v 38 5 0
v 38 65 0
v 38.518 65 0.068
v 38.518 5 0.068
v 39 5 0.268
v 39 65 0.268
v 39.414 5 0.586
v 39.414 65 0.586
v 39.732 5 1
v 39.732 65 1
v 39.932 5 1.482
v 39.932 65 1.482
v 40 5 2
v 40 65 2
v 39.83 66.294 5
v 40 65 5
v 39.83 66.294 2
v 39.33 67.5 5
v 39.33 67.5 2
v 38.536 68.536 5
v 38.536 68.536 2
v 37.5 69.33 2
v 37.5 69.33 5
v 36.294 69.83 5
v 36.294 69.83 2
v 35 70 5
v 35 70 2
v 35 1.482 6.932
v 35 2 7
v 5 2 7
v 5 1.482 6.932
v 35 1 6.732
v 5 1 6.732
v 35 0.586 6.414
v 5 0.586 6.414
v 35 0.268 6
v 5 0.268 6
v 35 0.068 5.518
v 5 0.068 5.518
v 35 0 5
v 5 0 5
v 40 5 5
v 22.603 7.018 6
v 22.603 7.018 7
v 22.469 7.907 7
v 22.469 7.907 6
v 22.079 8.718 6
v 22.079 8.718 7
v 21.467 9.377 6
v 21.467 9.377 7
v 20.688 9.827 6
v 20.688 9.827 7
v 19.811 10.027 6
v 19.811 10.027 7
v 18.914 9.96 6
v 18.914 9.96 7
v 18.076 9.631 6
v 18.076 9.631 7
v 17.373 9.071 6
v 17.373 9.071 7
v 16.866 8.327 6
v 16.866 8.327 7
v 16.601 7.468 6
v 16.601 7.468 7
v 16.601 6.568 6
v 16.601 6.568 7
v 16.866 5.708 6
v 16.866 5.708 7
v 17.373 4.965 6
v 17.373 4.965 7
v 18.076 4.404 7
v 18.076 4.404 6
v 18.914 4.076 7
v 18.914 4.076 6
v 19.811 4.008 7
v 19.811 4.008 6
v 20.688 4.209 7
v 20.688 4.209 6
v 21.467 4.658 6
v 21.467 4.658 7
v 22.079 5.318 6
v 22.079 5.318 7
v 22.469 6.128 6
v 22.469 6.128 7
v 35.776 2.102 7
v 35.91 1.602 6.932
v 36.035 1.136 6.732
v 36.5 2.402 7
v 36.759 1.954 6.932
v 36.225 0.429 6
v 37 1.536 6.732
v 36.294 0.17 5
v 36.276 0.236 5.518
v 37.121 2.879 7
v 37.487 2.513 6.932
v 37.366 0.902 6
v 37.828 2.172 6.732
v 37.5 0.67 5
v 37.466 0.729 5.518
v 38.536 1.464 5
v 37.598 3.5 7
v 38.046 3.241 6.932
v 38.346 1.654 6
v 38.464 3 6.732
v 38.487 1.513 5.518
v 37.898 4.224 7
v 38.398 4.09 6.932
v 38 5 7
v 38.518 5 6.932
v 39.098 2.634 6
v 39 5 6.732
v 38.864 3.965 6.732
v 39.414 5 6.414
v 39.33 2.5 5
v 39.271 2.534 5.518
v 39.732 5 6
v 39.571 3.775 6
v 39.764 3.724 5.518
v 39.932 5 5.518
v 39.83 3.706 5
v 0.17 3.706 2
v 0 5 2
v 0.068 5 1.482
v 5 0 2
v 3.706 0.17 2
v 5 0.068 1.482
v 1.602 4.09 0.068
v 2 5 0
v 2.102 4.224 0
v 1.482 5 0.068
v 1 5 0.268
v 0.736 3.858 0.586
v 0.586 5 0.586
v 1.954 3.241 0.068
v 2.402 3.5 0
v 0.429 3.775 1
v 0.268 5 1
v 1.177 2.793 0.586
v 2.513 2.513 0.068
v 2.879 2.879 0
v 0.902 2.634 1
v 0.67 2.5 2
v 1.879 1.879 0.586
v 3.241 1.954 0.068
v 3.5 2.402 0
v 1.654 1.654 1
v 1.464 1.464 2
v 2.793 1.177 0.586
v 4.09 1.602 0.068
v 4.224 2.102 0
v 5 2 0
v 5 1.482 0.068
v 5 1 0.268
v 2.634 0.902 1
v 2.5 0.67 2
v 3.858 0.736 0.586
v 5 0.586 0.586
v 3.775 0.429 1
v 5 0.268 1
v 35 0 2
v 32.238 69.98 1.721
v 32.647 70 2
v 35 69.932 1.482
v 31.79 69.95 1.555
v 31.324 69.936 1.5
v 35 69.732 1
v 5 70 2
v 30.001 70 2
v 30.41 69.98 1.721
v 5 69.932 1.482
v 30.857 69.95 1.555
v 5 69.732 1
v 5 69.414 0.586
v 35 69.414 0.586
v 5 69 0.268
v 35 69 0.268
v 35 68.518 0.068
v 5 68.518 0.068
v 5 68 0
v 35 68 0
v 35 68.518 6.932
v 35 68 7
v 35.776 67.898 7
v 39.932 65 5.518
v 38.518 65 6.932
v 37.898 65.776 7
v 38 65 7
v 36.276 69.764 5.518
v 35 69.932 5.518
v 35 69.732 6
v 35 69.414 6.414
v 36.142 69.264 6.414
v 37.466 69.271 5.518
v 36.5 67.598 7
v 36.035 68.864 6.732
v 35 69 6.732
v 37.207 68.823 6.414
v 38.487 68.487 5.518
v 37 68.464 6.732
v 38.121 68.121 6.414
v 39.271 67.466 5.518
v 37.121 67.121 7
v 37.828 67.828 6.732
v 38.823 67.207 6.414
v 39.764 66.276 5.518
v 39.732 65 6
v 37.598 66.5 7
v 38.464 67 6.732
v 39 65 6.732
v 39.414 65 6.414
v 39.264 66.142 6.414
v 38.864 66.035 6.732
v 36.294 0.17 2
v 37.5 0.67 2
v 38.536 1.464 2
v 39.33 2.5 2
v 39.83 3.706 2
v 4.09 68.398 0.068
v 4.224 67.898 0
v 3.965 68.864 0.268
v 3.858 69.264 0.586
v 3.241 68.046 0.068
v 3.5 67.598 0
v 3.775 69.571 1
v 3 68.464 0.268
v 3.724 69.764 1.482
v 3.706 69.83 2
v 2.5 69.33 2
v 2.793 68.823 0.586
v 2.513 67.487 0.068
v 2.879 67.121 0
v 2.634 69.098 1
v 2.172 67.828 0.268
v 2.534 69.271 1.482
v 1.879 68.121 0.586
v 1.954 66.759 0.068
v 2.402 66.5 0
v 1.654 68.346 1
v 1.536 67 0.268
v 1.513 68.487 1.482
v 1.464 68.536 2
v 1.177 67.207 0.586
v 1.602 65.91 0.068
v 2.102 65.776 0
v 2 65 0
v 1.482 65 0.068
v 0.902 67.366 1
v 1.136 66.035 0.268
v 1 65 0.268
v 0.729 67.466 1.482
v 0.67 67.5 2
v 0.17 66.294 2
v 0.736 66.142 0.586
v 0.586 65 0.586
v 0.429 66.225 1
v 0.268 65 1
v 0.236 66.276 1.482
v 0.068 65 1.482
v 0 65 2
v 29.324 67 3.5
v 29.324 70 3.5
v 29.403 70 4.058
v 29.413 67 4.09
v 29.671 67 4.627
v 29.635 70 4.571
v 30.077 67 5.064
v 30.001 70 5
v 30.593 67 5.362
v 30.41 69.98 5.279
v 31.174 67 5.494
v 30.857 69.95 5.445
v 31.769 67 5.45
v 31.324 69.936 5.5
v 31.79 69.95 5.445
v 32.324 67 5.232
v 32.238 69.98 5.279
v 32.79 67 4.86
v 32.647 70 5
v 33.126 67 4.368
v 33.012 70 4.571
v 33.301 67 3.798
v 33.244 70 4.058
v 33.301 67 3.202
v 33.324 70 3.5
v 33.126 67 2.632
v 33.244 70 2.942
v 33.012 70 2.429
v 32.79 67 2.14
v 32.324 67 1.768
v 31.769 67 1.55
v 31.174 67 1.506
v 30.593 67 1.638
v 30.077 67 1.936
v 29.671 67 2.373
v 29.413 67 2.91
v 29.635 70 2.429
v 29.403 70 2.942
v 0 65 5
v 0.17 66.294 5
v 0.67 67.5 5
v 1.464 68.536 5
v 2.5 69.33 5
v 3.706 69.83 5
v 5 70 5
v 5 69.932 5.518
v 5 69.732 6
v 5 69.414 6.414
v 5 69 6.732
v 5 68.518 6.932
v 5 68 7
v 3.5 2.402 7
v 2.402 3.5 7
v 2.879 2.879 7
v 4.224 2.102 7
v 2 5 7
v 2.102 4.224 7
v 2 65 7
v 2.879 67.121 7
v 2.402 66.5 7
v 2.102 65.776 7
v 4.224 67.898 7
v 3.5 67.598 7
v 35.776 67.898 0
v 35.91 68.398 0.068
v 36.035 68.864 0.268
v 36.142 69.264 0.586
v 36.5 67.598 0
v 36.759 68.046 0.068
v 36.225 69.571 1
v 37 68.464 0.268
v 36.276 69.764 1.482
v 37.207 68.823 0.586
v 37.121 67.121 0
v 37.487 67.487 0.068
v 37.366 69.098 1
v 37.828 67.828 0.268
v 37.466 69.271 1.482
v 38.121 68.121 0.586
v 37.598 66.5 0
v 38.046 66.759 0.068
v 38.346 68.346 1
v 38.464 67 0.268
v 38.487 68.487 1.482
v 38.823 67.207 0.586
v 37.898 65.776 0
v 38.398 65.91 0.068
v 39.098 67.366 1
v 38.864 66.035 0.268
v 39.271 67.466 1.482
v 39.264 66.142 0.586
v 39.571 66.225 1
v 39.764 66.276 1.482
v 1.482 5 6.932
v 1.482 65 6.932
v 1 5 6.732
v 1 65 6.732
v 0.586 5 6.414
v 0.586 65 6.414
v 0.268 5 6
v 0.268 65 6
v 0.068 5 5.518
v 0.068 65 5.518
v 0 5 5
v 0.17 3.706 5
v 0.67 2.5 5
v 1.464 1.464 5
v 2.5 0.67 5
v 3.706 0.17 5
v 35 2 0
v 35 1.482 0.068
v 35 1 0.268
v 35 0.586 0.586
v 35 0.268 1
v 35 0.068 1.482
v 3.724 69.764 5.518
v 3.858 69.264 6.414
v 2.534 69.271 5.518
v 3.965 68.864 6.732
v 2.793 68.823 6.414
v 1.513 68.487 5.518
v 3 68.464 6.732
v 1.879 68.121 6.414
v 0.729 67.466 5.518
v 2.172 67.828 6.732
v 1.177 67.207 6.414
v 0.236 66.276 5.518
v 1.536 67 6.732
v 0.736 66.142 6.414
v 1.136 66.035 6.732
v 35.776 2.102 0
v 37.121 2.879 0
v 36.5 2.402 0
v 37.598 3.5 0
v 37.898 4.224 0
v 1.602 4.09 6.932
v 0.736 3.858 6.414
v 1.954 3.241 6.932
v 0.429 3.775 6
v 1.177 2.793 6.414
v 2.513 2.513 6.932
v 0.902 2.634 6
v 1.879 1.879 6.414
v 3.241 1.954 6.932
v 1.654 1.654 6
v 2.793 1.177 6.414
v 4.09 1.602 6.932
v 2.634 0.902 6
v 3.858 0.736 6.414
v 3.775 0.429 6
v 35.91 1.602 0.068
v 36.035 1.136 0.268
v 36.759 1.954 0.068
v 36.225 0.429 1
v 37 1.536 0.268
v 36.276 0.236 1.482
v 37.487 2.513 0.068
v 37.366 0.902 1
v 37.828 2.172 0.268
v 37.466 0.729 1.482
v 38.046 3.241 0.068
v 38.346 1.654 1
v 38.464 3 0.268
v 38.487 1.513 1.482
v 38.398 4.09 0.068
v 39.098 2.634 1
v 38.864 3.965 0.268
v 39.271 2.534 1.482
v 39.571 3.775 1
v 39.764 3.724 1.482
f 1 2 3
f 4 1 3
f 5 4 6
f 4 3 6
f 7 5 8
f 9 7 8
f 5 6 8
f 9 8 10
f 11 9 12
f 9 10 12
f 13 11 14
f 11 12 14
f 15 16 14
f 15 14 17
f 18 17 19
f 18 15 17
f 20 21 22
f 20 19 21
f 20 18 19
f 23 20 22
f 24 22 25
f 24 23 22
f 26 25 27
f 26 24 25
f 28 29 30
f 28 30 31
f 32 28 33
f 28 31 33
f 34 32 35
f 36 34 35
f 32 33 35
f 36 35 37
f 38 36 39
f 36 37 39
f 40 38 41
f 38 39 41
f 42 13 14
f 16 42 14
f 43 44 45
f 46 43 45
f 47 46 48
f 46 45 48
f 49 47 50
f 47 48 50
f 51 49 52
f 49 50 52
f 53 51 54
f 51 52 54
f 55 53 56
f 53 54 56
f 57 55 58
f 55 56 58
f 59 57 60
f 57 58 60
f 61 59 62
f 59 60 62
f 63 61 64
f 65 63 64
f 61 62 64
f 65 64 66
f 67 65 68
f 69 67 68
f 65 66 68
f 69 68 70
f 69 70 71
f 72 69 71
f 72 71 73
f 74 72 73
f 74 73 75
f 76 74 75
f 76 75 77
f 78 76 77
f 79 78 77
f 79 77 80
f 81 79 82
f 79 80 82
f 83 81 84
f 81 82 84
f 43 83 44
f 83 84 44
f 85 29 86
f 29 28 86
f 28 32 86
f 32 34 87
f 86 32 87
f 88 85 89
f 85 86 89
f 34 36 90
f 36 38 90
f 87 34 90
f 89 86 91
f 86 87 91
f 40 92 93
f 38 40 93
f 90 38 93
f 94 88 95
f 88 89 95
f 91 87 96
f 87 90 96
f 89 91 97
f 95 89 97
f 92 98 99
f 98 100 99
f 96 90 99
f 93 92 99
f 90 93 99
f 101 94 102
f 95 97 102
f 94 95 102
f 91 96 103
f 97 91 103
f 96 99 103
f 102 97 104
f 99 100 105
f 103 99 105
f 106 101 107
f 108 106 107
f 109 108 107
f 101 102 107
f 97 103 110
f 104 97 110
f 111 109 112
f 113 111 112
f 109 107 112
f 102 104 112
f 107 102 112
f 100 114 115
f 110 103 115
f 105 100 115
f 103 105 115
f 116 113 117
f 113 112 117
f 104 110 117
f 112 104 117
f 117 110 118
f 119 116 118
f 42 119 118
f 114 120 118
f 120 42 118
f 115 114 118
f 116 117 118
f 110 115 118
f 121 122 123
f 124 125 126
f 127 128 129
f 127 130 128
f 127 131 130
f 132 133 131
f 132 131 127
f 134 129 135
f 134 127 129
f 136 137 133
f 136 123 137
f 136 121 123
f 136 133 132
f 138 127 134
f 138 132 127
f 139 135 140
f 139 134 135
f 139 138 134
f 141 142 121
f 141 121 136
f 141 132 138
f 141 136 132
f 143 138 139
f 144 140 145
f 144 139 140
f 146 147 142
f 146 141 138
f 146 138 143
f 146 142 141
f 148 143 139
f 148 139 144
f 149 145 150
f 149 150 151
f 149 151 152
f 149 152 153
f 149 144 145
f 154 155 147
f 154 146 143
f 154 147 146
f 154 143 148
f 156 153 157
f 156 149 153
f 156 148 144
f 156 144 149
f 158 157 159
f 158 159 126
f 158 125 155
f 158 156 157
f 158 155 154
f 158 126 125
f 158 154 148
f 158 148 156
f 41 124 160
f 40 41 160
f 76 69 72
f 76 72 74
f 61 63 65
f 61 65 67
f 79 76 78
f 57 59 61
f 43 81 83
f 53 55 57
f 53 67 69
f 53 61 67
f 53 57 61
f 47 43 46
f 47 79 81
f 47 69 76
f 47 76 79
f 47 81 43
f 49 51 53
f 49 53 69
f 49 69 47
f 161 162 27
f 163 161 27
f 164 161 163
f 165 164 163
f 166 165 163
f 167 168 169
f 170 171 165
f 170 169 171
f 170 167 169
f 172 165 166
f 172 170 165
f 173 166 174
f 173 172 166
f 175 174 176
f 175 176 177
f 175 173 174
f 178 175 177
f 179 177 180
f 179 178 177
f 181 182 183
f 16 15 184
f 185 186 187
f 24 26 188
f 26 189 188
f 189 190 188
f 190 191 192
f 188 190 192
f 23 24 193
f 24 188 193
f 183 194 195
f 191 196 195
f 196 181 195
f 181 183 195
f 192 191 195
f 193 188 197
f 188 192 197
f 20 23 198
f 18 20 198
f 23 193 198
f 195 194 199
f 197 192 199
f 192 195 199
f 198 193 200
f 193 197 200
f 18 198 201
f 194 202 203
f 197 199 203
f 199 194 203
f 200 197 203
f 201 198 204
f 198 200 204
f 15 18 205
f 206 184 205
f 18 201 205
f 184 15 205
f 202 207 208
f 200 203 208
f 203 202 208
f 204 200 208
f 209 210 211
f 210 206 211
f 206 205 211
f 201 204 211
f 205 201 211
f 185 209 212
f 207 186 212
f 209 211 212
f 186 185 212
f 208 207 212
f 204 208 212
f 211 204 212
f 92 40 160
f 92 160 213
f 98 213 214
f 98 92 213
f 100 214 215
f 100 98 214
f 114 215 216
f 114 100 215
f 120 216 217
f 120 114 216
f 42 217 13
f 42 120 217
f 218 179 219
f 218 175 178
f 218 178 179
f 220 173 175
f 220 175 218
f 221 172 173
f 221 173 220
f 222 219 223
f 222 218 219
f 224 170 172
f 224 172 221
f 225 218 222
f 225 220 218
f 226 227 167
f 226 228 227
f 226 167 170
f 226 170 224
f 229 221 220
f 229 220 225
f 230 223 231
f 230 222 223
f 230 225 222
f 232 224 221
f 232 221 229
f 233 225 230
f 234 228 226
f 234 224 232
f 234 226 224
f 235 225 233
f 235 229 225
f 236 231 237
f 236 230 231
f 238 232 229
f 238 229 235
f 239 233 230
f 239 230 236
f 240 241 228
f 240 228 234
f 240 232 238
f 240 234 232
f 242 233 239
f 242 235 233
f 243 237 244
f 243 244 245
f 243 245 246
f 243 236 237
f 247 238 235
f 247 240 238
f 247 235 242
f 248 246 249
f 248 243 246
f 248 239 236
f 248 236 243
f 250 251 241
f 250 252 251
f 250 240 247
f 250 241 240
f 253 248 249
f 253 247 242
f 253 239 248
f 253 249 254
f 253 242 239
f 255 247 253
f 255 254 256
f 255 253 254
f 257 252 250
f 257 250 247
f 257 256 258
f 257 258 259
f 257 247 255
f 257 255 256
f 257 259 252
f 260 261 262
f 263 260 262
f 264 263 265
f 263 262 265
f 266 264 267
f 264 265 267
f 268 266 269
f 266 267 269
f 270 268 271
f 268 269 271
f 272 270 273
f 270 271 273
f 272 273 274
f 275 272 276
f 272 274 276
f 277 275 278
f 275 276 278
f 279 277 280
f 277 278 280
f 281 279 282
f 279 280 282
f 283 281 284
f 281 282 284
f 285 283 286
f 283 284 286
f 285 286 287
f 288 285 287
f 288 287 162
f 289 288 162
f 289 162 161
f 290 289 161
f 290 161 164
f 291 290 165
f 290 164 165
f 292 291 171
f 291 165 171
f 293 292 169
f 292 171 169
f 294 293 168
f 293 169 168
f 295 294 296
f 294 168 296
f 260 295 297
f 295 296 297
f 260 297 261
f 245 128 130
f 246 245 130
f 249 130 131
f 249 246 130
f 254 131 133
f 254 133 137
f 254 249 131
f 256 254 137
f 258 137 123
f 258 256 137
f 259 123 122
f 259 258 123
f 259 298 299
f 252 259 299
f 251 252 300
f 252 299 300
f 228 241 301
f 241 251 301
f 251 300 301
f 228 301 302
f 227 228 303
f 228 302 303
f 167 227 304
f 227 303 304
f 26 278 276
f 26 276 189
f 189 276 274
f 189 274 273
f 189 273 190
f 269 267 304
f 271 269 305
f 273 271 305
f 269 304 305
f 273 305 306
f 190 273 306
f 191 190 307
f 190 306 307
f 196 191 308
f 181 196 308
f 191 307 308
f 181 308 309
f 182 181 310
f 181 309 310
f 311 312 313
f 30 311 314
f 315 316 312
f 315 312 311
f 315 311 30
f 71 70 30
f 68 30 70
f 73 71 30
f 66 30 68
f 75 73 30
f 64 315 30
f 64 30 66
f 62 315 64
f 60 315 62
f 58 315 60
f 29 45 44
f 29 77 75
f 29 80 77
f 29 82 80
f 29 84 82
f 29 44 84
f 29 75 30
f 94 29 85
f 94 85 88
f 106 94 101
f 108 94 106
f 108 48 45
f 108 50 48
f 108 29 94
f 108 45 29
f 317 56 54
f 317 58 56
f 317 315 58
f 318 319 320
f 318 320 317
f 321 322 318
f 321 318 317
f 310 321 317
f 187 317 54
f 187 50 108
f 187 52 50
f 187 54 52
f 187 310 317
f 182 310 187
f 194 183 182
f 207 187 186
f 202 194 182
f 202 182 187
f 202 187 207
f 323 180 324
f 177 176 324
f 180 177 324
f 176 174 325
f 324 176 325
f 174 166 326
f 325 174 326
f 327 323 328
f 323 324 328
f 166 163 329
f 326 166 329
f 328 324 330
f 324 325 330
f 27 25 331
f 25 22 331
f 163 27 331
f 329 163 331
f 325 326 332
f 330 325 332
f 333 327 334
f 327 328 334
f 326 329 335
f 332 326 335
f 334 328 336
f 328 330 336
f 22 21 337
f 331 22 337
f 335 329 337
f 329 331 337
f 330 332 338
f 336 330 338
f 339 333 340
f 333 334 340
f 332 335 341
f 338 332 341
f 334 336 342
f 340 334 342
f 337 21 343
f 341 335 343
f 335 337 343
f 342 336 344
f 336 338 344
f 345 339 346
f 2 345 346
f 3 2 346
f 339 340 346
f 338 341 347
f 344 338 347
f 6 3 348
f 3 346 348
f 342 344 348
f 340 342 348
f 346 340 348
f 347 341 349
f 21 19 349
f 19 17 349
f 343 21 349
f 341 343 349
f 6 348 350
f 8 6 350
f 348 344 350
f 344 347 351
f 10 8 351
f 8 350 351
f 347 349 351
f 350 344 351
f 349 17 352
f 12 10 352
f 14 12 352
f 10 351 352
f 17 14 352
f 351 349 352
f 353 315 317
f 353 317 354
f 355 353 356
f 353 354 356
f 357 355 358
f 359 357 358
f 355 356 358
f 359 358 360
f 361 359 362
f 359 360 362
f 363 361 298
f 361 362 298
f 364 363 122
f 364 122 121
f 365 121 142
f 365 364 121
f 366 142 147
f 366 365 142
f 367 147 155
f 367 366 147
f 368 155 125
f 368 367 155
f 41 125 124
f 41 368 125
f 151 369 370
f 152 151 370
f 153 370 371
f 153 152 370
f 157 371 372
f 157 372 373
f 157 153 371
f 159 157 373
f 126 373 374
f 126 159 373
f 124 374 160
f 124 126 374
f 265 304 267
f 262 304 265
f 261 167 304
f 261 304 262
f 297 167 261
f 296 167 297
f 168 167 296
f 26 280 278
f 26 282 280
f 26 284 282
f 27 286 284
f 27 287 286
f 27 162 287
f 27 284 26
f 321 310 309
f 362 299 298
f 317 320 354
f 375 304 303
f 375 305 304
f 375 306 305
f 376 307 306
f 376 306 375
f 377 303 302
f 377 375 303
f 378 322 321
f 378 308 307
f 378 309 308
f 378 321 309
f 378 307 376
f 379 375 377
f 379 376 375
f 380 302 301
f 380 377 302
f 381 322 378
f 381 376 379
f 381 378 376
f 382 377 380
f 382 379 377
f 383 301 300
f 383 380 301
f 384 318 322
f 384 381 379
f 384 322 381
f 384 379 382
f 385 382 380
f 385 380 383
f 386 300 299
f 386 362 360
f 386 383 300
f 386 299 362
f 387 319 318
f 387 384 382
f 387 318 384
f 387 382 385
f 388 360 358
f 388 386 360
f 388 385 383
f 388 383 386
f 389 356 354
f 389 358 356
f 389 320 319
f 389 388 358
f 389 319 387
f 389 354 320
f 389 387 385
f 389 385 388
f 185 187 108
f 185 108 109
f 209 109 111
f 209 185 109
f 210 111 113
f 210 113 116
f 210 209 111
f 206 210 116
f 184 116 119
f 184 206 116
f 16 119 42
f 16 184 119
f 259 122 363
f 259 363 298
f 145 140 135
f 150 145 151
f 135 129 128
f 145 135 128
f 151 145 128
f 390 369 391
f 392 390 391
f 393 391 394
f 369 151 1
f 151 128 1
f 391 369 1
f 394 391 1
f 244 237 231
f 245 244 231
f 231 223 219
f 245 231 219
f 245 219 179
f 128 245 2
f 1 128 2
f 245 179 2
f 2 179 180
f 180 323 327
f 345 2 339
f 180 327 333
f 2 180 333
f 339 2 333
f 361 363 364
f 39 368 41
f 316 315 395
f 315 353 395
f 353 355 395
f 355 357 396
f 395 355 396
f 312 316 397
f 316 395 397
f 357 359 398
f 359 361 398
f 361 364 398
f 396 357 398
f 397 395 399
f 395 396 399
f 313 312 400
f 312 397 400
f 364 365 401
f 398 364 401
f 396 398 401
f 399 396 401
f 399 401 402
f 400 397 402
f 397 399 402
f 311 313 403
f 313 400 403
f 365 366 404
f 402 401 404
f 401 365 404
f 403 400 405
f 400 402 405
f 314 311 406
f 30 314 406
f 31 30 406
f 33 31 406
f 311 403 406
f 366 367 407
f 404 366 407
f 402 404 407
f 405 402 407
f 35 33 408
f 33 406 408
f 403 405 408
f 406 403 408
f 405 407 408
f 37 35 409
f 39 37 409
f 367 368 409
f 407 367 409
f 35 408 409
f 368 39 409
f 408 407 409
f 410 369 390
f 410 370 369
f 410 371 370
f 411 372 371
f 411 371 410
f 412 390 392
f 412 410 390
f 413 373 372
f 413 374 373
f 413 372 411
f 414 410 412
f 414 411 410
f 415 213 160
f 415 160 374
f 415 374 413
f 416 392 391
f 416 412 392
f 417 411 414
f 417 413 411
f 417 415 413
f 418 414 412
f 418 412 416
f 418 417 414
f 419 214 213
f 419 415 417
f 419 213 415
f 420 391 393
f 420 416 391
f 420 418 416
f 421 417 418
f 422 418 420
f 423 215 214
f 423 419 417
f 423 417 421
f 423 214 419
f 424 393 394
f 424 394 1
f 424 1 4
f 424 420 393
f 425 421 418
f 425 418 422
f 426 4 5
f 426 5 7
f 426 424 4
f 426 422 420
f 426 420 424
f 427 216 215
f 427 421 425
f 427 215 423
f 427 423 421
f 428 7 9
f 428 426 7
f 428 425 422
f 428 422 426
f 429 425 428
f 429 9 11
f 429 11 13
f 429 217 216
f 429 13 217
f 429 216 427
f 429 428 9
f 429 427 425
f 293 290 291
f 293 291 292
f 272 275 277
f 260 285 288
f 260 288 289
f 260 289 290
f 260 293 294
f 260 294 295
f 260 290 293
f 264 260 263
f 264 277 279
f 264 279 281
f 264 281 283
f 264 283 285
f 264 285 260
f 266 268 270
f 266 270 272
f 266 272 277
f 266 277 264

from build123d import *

# Parameters (mm, degrees)
F0_W         = 40
F0_H         = 70
F1_DEPTH     = 7
F2_R         = 5
F3_R         = 2
F4_DEPTH     = 3
F6_T1_DEPTH  = 60
F6_T3_DEPTH  = 30
F6_T6_ANGLE  = 90
F6_T8_ANGLE  = 90
F6_T10_ANGLE = 90
F6_T12_ANGLE = 90
F6_T14_ANGLE = 90
F6_T16_ANGLE = 90
F6_T18_ANGLE = 90
F6_T20_ANGLE = 90
F7_R         = 3.0179077215
F8_DEPTH     = 1


# Not quite as in the source:
# - a fillet or chamfer that OpenCascade refuses, or shapes differently, is made with other operations: its cross-section is extruded or revolved along the edge and cut away or added
# - a feature of the source that left no trace in its solid (it failed there, or was rolled back) is left out


with BuildPart() as f1:
    # F0 (on Top) → F1 (new body)
    with BuildSketch(Plane.XY):
        with Locations((20, 35)):
            Rectangle(F0_W, F0_H)
    extrude(amount=F1_DEPTH)

    # F2
    f2_edges = [f1.edges().sort_by_distance(p)[0] for p in [
        (40, 0, 3.5),
        (40, 70, 3.5),
        (0, 70, 3.5),
        (0, 0, 3.5),
    ]]
    fillet(f2_edges, radius=F2_R)

    # F3 (on face) → F4 (cut)
    with BuildSketch(Plane(origin=(0, 70, 0), x_dir=(-1, 0, 0), z_dir=(0, 1, 0))):
        with Locations((-31.323697418, 3.5)):
            Circle(F3_R)
    extrude(amount=-F4_DEPTH, mode=Mode.SUBTRACT)

    # F6: fillet of radius 2 on 16 edges, made by hand

    # F6_s2 → F6_t1 (cut)
    with BuildSketch(Plane.XZ.offset(-65)):
        with BuildLine():
            ThreePointArc((2, 7), (0.5857864376, 6.4142135624), (0, 5))
            Line((0, 5), (0, 7))
            Line((0, 7), (2, 7))
        make_face()
        with BuildLine():
            ThreePointArc((38, 0), (39.4142135624, 0.5857864376), (40, 2))
            Line((40, 2), (40, 0))
            Line((40, 0), (38, 0))
        make_face()
        with BuildLine():
            ThreePointArc((2, 0), (0.5857864376, 0.5857864376), (0, 2))
            Line((0, 2), (0, 0))
            Line((0, 0), (2, 0))
        make_face()
        with BuildLine():
            ThreePointArc((38, 7), (39.4142135624, 6.4142135624), (40, 5))
            Line((40, 5), (40, 7))
            Line((40, 7), (38, 7))
        make_face()
    extrude(amount=F6_T1_DEPTH, mode=Mode.SUBTRACT)

    # F6_s4 → F6_t3 (cut)
    with BuildSketch(Plane.YZ.offset(5)):
        with BuildLine():
            ThreePointArc((70, 2), (69.4142135624, 0.5857864376), (68, 0))
            Line((68, 0), (70, 0))
            Line((70, 0), (70, 2))
        make_face()
        with BuildLine():
            ThreePointArc((70, 5), (69.4142135624, 6.4142135624), (68, 7))
            Line((68, 7), (70, 7))
            Line((70, 7), (70, 5))
        make_face()
        with BuildLine():
            ThreePointArc((2, 0), (0.5857864376, 0.5857864376), (0, 2))
            Line((0, 2), (0, 0))
            Line((0, 0), (2, 0))
        make_face()
        with BuildLine():
            ThreePointArc((2, 7), (0.5857864376, 6.4142135624), (0, 5))
            Line((0, 5), (0, 7))
            Line((0, 7), (2, 7))
        make_face()
    extrude(amount=F6_T3_DEPTH, mode=Mode.SUBTRACT)

    # F6_s5 → F6_t6 (revolve, cut)
    with BuildSketch(Plane.YZ.offset(35)):
        with BuildLine():
            ThreePointArc((68, 0), (69.4142135624, 0.5857864376), (70, 2))
            Line((70, 2), (70, 0))
            Line((70, 0), (68, 0))
        make_face()
    revolve(axis=Axis((35, 65, 0), (0, 0, -1)), revolution_arc=F6_T6_ANGLE, mode=Mode.SUBTRACT)

    # F6_s7 → F6_t8 (revolve, cut)
    with BuildSketch(Plane.YZ.offset(5)):
        with BuildLine():
            ThreePointArc((68, 0), (69.4142135624, 0.5857864376), (70, 2))
            Line((70, 2), (70, 0))
            Line((70, 0), (68, 0))
        make_face()
    revolve(axis=Axis((5, 65, 0), (0, 0, 1)), revolution_arc=F6_T8_ANGLE, mode=Mode.SUBTRACT)

    # F6_s9 → F6_t10 (revolve, cut)
    with BuildSketch(Plane.YZ.offset(35)):
        with BuildLine():
            ThreePointArc((2, 0), (0.5857864376, 0.5857864376), (0, 2))
            Line((0, 2), (0, 0))
            Line((0, 0), (2, 0))
        make_face()
    revolve(axis=Axis((35, 5, 0), (0, 0, 1)), revolution_arc=F6_T10_ANGLE, mode=Mode.SUBTRACT)

    # F6_s11 → F6_t12 (revolve, cut)
    with BuildSketch(Plane.XZ.offset(-5)):
        with BuildLine():
            ThreePointArc((2, 0), (0.5857864376, 0.5857864376), (0, 2))
            Line((0, 2), (0, 0))
            Line((0, 0), (2, 0))
        make_face()
    revolve(axis=Axis((5, 5, 0), (0, 0, 1)), revolution_arc=F6_T12_ANGLE, mode=Mode.SUBTRACT)

    # F6_s13 → F6_t14 (revolve, cut)
    with BuildSketch(Plane.YZ.offset(35)):
        with BuildLine():
            ThreePointArc((70, 5), (69.4142135624, 6.4142135624), (68, 7))
            Line((68, 7), (70, 7))
            Line((70, 7), (70, 5))
        make_face()
    revolve(axis=Axis((35, 65, 7), (0, 0, -1)), revolution_arc=F6_T14_ANGLE, mode=Mode.SUBTRACT)

    # F6_s15 → F6_t16 (revolve, cut)
    with BuildSketch(Plane.YZ.offset(5)):
        with BuildLine():
            ThreePointArc((70, 5), (69.4142135624, 6.4142135624), (68, 7))
            Line((68, 7), (70, 7))
            Line((70, 7), (70, 5))
        make_face()
    revolve(axis=Axis((5, 65, 7), (0, 0, 1)), revolution_arc=F6_T16_ANGLE, mode=Mode.SUBTRACT)

    # F6_s17 → F6_t18 (revolve, cut)
    with BuildSketch(Plane.YZ.offset(35)):
        with BuildLine():
            ThreePointArc((2, 7), (0.5857864376, 6.4142135624), (0, 5))
            Line((0, 5), (0, 7))
            Line((0, 7), (2, 7))
        make_face()
    revolve(axis=Axis((35, 5, 7), (0, 0, 1)), revolution_arc=F6_T18_ANGLE, mode=Mode.SUBTRACT)

    # F6_s19 → F6_t20 (revolve, cut)
    with BuildSketch(Plane.XZ.offset(-5)):
        with BuildLine():
            ThreePointArc((2, 7), (0.5857864376, 6.4142135624), (0, 5))
            Line((0, 5), (0, 7))
            Line((0, 7), (2, 7))
        make_face()
    revolve(axis=Axis((5, 5, 7), (0, 0, 1)), revolution_arc=F6_T20_ANGLE, mode=Mode.SUBTRACT)

    # F7 (on face) → F8 (cut)
    with BuildSketch(Plane.XY.offset(7)):
        with Locations((19.5853062672, 7.0179077215)):
            Circle(F7_R)
    extrude(amount=-F8_DEPTH, mode=Mode.SUBTRACT)


solid = f1.part
